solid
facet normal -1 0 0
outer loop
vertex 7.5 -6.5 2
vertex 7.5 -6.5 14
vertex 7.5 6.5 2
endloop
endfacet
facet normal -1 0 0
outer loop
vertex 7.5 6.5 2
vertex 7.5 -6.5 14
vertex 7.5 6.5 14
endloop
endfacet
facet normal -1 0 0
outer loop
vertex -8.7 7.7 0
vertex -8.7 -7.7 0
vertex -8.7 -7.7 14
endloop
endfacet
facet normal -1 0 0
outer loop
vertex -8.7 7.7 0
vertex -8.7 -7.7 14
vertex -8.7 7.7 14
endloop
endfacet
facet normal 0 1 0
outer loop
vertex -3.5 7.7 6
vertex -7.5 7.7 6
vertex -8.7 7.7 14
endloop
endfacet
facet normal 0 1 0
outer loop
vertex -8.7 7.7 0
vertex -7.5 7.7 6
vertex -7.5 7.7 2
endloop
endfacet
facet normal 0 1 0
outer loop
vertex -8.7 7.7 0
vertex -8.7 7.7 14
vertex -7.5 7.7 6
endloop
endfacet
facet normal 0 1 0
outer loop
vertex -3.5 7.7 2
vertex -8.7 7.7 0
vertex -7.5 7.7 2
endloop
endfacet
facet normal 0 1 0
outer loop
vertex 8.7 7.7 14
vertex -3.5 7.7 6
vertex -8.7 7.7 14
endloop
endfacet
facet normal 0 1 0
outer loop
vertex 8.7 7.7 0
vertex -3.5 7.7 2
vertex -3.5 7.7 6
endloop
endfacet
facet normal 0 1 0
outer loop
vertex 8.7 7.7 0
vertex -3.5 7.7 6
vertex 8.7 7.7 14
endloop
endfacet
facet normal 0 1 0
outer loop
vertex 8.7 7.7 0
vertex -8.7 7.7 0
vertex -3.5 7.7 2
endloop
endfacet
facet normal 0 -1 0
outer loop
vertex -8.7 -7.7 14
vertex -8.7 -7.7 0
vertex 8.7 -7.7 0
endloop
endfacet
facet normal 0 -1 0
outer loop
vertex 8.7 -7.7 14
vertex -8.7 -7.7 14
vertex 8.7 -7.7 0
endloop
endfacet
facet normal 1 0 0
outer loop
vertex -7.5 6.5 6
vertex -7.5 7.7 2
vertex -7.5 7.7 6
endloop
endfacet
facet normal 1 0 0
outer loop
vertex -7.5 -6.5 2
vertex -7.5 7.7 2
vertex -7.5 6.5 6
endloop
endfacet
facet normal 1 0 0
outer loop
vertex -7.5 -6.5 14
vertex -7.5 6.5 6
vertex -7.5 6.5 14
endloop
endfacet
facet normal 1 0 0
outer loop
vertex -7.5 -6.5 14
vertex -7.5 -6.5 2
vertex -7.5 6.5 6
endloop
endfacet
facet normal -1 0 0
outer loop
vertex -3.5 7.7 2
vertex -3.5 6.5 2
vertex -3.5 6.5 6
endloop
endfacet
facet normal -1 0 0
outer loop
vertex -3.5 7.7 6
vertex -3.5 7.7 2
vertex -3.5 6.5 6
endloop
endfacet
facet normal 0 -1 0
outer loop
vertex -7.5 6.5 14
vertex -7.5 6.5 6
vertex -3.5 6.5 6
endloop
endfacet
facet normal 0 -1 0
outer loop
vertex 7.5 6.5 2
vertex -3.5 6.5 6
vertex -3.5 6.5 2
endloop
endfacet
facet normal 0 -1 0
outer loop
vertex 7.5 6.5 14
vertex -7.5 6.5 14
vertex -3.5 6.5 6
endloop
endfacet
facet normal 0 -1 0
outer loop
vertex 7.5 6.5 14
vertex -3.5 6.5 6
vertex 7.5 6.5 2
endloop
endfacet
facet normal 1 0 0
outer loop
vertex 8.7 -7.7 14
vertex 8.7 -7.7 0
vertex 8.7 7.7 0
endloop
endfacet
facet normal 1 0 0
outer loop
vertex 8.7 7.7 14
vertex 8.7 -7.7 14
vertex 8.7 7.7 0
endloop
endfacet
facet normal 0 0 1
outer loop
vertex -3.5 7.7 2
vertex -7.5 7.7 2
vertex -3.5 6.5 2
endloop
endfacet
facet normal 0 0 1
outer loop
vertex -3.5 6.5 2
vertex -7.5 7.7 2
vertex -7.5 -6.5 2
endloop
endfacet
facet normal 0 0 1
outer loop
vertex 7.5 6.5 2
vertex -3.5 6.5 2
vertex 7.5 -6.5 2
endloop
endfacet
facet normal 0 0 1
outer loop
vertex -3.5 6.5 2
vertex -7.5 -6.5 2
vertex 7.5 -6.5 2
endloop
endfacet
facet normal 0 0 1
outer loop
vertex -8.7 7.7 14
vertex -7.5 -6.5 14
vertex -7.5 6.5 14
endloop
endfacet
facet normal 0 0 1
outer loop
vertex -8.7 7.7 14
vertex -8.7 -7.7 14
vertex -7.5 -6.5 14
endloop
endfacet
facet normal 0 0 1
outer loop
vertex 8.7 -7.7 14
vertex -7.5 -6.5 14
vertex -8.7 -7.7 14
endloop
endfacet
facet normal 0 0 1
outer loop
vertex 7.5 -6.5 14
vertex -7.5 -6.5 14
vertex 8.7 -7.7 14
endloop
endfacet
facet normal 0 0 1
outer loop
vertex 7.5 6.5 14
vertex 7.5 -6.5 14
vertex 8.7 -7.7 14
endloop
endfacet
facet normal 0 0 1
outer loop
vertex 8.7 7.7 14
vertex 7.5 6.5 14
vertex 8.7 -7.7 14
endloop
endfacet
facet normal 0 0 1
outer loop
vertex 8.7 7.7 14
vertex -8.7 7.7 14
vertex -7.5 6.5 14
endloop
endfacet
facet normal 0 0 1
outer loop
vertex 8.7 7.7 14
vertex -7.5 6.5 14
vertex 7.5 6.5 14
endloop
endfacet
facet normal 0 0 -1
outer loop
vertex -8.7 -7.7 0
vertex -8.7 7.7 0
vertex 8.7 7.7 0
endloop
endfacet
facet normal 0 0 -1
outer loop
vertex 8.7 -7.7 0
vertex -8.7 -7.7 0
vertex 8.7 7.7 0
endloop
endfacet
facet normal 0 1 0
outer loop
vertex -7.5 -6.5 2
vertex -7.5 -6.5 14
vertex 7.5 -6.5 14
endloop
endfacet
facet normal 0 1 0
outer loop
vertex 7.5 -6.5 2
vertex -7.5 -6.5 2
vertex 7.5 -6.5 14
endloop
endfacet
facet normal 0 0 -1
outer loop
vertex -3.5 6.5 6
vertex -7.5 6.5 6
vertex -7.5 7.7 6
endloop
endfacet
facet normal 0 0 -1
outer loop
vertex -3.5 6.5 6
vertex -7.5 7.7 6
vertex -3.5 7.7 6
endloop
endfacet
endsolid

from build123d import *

# Parameters (mm, degrees)
F0_W     = 17.4
F0_H     = 15.4
F1_DEPTH = 14
F2_W     = 15
F2_H     = 13
F3_DEPTH = 12
F4_W     = 4
F4_H     = 4
F5_DEPTH = 1.2


with BuildPart() as f1:
    # F0 (on Top) → F1 (new body)
    with BuildSketch(Plane.XY):
        Rectangle(F0_W, F0_H)
    extrude(amount=F1_DEPTH)

    # F2 (on face) → F3 (cut)
    with BuildSketch(Plane.XY.offset(14)):
        Rectangle(F2_W, F2_H)
    extrude(amount=-F3_DEPTH, mode=Mode.SUBTRACT)

    # F4 (on face) → F5 (cut)
    with BuildSketch(Plane.XZ.offset(-6.5)):
        with Locations((-5.5, 4)):
            Rectangle(F4_W, F4_H)
    extrude(amount=-F5_DEPTH, mode=Mode.SUBTRACT)


solid = f1.part
